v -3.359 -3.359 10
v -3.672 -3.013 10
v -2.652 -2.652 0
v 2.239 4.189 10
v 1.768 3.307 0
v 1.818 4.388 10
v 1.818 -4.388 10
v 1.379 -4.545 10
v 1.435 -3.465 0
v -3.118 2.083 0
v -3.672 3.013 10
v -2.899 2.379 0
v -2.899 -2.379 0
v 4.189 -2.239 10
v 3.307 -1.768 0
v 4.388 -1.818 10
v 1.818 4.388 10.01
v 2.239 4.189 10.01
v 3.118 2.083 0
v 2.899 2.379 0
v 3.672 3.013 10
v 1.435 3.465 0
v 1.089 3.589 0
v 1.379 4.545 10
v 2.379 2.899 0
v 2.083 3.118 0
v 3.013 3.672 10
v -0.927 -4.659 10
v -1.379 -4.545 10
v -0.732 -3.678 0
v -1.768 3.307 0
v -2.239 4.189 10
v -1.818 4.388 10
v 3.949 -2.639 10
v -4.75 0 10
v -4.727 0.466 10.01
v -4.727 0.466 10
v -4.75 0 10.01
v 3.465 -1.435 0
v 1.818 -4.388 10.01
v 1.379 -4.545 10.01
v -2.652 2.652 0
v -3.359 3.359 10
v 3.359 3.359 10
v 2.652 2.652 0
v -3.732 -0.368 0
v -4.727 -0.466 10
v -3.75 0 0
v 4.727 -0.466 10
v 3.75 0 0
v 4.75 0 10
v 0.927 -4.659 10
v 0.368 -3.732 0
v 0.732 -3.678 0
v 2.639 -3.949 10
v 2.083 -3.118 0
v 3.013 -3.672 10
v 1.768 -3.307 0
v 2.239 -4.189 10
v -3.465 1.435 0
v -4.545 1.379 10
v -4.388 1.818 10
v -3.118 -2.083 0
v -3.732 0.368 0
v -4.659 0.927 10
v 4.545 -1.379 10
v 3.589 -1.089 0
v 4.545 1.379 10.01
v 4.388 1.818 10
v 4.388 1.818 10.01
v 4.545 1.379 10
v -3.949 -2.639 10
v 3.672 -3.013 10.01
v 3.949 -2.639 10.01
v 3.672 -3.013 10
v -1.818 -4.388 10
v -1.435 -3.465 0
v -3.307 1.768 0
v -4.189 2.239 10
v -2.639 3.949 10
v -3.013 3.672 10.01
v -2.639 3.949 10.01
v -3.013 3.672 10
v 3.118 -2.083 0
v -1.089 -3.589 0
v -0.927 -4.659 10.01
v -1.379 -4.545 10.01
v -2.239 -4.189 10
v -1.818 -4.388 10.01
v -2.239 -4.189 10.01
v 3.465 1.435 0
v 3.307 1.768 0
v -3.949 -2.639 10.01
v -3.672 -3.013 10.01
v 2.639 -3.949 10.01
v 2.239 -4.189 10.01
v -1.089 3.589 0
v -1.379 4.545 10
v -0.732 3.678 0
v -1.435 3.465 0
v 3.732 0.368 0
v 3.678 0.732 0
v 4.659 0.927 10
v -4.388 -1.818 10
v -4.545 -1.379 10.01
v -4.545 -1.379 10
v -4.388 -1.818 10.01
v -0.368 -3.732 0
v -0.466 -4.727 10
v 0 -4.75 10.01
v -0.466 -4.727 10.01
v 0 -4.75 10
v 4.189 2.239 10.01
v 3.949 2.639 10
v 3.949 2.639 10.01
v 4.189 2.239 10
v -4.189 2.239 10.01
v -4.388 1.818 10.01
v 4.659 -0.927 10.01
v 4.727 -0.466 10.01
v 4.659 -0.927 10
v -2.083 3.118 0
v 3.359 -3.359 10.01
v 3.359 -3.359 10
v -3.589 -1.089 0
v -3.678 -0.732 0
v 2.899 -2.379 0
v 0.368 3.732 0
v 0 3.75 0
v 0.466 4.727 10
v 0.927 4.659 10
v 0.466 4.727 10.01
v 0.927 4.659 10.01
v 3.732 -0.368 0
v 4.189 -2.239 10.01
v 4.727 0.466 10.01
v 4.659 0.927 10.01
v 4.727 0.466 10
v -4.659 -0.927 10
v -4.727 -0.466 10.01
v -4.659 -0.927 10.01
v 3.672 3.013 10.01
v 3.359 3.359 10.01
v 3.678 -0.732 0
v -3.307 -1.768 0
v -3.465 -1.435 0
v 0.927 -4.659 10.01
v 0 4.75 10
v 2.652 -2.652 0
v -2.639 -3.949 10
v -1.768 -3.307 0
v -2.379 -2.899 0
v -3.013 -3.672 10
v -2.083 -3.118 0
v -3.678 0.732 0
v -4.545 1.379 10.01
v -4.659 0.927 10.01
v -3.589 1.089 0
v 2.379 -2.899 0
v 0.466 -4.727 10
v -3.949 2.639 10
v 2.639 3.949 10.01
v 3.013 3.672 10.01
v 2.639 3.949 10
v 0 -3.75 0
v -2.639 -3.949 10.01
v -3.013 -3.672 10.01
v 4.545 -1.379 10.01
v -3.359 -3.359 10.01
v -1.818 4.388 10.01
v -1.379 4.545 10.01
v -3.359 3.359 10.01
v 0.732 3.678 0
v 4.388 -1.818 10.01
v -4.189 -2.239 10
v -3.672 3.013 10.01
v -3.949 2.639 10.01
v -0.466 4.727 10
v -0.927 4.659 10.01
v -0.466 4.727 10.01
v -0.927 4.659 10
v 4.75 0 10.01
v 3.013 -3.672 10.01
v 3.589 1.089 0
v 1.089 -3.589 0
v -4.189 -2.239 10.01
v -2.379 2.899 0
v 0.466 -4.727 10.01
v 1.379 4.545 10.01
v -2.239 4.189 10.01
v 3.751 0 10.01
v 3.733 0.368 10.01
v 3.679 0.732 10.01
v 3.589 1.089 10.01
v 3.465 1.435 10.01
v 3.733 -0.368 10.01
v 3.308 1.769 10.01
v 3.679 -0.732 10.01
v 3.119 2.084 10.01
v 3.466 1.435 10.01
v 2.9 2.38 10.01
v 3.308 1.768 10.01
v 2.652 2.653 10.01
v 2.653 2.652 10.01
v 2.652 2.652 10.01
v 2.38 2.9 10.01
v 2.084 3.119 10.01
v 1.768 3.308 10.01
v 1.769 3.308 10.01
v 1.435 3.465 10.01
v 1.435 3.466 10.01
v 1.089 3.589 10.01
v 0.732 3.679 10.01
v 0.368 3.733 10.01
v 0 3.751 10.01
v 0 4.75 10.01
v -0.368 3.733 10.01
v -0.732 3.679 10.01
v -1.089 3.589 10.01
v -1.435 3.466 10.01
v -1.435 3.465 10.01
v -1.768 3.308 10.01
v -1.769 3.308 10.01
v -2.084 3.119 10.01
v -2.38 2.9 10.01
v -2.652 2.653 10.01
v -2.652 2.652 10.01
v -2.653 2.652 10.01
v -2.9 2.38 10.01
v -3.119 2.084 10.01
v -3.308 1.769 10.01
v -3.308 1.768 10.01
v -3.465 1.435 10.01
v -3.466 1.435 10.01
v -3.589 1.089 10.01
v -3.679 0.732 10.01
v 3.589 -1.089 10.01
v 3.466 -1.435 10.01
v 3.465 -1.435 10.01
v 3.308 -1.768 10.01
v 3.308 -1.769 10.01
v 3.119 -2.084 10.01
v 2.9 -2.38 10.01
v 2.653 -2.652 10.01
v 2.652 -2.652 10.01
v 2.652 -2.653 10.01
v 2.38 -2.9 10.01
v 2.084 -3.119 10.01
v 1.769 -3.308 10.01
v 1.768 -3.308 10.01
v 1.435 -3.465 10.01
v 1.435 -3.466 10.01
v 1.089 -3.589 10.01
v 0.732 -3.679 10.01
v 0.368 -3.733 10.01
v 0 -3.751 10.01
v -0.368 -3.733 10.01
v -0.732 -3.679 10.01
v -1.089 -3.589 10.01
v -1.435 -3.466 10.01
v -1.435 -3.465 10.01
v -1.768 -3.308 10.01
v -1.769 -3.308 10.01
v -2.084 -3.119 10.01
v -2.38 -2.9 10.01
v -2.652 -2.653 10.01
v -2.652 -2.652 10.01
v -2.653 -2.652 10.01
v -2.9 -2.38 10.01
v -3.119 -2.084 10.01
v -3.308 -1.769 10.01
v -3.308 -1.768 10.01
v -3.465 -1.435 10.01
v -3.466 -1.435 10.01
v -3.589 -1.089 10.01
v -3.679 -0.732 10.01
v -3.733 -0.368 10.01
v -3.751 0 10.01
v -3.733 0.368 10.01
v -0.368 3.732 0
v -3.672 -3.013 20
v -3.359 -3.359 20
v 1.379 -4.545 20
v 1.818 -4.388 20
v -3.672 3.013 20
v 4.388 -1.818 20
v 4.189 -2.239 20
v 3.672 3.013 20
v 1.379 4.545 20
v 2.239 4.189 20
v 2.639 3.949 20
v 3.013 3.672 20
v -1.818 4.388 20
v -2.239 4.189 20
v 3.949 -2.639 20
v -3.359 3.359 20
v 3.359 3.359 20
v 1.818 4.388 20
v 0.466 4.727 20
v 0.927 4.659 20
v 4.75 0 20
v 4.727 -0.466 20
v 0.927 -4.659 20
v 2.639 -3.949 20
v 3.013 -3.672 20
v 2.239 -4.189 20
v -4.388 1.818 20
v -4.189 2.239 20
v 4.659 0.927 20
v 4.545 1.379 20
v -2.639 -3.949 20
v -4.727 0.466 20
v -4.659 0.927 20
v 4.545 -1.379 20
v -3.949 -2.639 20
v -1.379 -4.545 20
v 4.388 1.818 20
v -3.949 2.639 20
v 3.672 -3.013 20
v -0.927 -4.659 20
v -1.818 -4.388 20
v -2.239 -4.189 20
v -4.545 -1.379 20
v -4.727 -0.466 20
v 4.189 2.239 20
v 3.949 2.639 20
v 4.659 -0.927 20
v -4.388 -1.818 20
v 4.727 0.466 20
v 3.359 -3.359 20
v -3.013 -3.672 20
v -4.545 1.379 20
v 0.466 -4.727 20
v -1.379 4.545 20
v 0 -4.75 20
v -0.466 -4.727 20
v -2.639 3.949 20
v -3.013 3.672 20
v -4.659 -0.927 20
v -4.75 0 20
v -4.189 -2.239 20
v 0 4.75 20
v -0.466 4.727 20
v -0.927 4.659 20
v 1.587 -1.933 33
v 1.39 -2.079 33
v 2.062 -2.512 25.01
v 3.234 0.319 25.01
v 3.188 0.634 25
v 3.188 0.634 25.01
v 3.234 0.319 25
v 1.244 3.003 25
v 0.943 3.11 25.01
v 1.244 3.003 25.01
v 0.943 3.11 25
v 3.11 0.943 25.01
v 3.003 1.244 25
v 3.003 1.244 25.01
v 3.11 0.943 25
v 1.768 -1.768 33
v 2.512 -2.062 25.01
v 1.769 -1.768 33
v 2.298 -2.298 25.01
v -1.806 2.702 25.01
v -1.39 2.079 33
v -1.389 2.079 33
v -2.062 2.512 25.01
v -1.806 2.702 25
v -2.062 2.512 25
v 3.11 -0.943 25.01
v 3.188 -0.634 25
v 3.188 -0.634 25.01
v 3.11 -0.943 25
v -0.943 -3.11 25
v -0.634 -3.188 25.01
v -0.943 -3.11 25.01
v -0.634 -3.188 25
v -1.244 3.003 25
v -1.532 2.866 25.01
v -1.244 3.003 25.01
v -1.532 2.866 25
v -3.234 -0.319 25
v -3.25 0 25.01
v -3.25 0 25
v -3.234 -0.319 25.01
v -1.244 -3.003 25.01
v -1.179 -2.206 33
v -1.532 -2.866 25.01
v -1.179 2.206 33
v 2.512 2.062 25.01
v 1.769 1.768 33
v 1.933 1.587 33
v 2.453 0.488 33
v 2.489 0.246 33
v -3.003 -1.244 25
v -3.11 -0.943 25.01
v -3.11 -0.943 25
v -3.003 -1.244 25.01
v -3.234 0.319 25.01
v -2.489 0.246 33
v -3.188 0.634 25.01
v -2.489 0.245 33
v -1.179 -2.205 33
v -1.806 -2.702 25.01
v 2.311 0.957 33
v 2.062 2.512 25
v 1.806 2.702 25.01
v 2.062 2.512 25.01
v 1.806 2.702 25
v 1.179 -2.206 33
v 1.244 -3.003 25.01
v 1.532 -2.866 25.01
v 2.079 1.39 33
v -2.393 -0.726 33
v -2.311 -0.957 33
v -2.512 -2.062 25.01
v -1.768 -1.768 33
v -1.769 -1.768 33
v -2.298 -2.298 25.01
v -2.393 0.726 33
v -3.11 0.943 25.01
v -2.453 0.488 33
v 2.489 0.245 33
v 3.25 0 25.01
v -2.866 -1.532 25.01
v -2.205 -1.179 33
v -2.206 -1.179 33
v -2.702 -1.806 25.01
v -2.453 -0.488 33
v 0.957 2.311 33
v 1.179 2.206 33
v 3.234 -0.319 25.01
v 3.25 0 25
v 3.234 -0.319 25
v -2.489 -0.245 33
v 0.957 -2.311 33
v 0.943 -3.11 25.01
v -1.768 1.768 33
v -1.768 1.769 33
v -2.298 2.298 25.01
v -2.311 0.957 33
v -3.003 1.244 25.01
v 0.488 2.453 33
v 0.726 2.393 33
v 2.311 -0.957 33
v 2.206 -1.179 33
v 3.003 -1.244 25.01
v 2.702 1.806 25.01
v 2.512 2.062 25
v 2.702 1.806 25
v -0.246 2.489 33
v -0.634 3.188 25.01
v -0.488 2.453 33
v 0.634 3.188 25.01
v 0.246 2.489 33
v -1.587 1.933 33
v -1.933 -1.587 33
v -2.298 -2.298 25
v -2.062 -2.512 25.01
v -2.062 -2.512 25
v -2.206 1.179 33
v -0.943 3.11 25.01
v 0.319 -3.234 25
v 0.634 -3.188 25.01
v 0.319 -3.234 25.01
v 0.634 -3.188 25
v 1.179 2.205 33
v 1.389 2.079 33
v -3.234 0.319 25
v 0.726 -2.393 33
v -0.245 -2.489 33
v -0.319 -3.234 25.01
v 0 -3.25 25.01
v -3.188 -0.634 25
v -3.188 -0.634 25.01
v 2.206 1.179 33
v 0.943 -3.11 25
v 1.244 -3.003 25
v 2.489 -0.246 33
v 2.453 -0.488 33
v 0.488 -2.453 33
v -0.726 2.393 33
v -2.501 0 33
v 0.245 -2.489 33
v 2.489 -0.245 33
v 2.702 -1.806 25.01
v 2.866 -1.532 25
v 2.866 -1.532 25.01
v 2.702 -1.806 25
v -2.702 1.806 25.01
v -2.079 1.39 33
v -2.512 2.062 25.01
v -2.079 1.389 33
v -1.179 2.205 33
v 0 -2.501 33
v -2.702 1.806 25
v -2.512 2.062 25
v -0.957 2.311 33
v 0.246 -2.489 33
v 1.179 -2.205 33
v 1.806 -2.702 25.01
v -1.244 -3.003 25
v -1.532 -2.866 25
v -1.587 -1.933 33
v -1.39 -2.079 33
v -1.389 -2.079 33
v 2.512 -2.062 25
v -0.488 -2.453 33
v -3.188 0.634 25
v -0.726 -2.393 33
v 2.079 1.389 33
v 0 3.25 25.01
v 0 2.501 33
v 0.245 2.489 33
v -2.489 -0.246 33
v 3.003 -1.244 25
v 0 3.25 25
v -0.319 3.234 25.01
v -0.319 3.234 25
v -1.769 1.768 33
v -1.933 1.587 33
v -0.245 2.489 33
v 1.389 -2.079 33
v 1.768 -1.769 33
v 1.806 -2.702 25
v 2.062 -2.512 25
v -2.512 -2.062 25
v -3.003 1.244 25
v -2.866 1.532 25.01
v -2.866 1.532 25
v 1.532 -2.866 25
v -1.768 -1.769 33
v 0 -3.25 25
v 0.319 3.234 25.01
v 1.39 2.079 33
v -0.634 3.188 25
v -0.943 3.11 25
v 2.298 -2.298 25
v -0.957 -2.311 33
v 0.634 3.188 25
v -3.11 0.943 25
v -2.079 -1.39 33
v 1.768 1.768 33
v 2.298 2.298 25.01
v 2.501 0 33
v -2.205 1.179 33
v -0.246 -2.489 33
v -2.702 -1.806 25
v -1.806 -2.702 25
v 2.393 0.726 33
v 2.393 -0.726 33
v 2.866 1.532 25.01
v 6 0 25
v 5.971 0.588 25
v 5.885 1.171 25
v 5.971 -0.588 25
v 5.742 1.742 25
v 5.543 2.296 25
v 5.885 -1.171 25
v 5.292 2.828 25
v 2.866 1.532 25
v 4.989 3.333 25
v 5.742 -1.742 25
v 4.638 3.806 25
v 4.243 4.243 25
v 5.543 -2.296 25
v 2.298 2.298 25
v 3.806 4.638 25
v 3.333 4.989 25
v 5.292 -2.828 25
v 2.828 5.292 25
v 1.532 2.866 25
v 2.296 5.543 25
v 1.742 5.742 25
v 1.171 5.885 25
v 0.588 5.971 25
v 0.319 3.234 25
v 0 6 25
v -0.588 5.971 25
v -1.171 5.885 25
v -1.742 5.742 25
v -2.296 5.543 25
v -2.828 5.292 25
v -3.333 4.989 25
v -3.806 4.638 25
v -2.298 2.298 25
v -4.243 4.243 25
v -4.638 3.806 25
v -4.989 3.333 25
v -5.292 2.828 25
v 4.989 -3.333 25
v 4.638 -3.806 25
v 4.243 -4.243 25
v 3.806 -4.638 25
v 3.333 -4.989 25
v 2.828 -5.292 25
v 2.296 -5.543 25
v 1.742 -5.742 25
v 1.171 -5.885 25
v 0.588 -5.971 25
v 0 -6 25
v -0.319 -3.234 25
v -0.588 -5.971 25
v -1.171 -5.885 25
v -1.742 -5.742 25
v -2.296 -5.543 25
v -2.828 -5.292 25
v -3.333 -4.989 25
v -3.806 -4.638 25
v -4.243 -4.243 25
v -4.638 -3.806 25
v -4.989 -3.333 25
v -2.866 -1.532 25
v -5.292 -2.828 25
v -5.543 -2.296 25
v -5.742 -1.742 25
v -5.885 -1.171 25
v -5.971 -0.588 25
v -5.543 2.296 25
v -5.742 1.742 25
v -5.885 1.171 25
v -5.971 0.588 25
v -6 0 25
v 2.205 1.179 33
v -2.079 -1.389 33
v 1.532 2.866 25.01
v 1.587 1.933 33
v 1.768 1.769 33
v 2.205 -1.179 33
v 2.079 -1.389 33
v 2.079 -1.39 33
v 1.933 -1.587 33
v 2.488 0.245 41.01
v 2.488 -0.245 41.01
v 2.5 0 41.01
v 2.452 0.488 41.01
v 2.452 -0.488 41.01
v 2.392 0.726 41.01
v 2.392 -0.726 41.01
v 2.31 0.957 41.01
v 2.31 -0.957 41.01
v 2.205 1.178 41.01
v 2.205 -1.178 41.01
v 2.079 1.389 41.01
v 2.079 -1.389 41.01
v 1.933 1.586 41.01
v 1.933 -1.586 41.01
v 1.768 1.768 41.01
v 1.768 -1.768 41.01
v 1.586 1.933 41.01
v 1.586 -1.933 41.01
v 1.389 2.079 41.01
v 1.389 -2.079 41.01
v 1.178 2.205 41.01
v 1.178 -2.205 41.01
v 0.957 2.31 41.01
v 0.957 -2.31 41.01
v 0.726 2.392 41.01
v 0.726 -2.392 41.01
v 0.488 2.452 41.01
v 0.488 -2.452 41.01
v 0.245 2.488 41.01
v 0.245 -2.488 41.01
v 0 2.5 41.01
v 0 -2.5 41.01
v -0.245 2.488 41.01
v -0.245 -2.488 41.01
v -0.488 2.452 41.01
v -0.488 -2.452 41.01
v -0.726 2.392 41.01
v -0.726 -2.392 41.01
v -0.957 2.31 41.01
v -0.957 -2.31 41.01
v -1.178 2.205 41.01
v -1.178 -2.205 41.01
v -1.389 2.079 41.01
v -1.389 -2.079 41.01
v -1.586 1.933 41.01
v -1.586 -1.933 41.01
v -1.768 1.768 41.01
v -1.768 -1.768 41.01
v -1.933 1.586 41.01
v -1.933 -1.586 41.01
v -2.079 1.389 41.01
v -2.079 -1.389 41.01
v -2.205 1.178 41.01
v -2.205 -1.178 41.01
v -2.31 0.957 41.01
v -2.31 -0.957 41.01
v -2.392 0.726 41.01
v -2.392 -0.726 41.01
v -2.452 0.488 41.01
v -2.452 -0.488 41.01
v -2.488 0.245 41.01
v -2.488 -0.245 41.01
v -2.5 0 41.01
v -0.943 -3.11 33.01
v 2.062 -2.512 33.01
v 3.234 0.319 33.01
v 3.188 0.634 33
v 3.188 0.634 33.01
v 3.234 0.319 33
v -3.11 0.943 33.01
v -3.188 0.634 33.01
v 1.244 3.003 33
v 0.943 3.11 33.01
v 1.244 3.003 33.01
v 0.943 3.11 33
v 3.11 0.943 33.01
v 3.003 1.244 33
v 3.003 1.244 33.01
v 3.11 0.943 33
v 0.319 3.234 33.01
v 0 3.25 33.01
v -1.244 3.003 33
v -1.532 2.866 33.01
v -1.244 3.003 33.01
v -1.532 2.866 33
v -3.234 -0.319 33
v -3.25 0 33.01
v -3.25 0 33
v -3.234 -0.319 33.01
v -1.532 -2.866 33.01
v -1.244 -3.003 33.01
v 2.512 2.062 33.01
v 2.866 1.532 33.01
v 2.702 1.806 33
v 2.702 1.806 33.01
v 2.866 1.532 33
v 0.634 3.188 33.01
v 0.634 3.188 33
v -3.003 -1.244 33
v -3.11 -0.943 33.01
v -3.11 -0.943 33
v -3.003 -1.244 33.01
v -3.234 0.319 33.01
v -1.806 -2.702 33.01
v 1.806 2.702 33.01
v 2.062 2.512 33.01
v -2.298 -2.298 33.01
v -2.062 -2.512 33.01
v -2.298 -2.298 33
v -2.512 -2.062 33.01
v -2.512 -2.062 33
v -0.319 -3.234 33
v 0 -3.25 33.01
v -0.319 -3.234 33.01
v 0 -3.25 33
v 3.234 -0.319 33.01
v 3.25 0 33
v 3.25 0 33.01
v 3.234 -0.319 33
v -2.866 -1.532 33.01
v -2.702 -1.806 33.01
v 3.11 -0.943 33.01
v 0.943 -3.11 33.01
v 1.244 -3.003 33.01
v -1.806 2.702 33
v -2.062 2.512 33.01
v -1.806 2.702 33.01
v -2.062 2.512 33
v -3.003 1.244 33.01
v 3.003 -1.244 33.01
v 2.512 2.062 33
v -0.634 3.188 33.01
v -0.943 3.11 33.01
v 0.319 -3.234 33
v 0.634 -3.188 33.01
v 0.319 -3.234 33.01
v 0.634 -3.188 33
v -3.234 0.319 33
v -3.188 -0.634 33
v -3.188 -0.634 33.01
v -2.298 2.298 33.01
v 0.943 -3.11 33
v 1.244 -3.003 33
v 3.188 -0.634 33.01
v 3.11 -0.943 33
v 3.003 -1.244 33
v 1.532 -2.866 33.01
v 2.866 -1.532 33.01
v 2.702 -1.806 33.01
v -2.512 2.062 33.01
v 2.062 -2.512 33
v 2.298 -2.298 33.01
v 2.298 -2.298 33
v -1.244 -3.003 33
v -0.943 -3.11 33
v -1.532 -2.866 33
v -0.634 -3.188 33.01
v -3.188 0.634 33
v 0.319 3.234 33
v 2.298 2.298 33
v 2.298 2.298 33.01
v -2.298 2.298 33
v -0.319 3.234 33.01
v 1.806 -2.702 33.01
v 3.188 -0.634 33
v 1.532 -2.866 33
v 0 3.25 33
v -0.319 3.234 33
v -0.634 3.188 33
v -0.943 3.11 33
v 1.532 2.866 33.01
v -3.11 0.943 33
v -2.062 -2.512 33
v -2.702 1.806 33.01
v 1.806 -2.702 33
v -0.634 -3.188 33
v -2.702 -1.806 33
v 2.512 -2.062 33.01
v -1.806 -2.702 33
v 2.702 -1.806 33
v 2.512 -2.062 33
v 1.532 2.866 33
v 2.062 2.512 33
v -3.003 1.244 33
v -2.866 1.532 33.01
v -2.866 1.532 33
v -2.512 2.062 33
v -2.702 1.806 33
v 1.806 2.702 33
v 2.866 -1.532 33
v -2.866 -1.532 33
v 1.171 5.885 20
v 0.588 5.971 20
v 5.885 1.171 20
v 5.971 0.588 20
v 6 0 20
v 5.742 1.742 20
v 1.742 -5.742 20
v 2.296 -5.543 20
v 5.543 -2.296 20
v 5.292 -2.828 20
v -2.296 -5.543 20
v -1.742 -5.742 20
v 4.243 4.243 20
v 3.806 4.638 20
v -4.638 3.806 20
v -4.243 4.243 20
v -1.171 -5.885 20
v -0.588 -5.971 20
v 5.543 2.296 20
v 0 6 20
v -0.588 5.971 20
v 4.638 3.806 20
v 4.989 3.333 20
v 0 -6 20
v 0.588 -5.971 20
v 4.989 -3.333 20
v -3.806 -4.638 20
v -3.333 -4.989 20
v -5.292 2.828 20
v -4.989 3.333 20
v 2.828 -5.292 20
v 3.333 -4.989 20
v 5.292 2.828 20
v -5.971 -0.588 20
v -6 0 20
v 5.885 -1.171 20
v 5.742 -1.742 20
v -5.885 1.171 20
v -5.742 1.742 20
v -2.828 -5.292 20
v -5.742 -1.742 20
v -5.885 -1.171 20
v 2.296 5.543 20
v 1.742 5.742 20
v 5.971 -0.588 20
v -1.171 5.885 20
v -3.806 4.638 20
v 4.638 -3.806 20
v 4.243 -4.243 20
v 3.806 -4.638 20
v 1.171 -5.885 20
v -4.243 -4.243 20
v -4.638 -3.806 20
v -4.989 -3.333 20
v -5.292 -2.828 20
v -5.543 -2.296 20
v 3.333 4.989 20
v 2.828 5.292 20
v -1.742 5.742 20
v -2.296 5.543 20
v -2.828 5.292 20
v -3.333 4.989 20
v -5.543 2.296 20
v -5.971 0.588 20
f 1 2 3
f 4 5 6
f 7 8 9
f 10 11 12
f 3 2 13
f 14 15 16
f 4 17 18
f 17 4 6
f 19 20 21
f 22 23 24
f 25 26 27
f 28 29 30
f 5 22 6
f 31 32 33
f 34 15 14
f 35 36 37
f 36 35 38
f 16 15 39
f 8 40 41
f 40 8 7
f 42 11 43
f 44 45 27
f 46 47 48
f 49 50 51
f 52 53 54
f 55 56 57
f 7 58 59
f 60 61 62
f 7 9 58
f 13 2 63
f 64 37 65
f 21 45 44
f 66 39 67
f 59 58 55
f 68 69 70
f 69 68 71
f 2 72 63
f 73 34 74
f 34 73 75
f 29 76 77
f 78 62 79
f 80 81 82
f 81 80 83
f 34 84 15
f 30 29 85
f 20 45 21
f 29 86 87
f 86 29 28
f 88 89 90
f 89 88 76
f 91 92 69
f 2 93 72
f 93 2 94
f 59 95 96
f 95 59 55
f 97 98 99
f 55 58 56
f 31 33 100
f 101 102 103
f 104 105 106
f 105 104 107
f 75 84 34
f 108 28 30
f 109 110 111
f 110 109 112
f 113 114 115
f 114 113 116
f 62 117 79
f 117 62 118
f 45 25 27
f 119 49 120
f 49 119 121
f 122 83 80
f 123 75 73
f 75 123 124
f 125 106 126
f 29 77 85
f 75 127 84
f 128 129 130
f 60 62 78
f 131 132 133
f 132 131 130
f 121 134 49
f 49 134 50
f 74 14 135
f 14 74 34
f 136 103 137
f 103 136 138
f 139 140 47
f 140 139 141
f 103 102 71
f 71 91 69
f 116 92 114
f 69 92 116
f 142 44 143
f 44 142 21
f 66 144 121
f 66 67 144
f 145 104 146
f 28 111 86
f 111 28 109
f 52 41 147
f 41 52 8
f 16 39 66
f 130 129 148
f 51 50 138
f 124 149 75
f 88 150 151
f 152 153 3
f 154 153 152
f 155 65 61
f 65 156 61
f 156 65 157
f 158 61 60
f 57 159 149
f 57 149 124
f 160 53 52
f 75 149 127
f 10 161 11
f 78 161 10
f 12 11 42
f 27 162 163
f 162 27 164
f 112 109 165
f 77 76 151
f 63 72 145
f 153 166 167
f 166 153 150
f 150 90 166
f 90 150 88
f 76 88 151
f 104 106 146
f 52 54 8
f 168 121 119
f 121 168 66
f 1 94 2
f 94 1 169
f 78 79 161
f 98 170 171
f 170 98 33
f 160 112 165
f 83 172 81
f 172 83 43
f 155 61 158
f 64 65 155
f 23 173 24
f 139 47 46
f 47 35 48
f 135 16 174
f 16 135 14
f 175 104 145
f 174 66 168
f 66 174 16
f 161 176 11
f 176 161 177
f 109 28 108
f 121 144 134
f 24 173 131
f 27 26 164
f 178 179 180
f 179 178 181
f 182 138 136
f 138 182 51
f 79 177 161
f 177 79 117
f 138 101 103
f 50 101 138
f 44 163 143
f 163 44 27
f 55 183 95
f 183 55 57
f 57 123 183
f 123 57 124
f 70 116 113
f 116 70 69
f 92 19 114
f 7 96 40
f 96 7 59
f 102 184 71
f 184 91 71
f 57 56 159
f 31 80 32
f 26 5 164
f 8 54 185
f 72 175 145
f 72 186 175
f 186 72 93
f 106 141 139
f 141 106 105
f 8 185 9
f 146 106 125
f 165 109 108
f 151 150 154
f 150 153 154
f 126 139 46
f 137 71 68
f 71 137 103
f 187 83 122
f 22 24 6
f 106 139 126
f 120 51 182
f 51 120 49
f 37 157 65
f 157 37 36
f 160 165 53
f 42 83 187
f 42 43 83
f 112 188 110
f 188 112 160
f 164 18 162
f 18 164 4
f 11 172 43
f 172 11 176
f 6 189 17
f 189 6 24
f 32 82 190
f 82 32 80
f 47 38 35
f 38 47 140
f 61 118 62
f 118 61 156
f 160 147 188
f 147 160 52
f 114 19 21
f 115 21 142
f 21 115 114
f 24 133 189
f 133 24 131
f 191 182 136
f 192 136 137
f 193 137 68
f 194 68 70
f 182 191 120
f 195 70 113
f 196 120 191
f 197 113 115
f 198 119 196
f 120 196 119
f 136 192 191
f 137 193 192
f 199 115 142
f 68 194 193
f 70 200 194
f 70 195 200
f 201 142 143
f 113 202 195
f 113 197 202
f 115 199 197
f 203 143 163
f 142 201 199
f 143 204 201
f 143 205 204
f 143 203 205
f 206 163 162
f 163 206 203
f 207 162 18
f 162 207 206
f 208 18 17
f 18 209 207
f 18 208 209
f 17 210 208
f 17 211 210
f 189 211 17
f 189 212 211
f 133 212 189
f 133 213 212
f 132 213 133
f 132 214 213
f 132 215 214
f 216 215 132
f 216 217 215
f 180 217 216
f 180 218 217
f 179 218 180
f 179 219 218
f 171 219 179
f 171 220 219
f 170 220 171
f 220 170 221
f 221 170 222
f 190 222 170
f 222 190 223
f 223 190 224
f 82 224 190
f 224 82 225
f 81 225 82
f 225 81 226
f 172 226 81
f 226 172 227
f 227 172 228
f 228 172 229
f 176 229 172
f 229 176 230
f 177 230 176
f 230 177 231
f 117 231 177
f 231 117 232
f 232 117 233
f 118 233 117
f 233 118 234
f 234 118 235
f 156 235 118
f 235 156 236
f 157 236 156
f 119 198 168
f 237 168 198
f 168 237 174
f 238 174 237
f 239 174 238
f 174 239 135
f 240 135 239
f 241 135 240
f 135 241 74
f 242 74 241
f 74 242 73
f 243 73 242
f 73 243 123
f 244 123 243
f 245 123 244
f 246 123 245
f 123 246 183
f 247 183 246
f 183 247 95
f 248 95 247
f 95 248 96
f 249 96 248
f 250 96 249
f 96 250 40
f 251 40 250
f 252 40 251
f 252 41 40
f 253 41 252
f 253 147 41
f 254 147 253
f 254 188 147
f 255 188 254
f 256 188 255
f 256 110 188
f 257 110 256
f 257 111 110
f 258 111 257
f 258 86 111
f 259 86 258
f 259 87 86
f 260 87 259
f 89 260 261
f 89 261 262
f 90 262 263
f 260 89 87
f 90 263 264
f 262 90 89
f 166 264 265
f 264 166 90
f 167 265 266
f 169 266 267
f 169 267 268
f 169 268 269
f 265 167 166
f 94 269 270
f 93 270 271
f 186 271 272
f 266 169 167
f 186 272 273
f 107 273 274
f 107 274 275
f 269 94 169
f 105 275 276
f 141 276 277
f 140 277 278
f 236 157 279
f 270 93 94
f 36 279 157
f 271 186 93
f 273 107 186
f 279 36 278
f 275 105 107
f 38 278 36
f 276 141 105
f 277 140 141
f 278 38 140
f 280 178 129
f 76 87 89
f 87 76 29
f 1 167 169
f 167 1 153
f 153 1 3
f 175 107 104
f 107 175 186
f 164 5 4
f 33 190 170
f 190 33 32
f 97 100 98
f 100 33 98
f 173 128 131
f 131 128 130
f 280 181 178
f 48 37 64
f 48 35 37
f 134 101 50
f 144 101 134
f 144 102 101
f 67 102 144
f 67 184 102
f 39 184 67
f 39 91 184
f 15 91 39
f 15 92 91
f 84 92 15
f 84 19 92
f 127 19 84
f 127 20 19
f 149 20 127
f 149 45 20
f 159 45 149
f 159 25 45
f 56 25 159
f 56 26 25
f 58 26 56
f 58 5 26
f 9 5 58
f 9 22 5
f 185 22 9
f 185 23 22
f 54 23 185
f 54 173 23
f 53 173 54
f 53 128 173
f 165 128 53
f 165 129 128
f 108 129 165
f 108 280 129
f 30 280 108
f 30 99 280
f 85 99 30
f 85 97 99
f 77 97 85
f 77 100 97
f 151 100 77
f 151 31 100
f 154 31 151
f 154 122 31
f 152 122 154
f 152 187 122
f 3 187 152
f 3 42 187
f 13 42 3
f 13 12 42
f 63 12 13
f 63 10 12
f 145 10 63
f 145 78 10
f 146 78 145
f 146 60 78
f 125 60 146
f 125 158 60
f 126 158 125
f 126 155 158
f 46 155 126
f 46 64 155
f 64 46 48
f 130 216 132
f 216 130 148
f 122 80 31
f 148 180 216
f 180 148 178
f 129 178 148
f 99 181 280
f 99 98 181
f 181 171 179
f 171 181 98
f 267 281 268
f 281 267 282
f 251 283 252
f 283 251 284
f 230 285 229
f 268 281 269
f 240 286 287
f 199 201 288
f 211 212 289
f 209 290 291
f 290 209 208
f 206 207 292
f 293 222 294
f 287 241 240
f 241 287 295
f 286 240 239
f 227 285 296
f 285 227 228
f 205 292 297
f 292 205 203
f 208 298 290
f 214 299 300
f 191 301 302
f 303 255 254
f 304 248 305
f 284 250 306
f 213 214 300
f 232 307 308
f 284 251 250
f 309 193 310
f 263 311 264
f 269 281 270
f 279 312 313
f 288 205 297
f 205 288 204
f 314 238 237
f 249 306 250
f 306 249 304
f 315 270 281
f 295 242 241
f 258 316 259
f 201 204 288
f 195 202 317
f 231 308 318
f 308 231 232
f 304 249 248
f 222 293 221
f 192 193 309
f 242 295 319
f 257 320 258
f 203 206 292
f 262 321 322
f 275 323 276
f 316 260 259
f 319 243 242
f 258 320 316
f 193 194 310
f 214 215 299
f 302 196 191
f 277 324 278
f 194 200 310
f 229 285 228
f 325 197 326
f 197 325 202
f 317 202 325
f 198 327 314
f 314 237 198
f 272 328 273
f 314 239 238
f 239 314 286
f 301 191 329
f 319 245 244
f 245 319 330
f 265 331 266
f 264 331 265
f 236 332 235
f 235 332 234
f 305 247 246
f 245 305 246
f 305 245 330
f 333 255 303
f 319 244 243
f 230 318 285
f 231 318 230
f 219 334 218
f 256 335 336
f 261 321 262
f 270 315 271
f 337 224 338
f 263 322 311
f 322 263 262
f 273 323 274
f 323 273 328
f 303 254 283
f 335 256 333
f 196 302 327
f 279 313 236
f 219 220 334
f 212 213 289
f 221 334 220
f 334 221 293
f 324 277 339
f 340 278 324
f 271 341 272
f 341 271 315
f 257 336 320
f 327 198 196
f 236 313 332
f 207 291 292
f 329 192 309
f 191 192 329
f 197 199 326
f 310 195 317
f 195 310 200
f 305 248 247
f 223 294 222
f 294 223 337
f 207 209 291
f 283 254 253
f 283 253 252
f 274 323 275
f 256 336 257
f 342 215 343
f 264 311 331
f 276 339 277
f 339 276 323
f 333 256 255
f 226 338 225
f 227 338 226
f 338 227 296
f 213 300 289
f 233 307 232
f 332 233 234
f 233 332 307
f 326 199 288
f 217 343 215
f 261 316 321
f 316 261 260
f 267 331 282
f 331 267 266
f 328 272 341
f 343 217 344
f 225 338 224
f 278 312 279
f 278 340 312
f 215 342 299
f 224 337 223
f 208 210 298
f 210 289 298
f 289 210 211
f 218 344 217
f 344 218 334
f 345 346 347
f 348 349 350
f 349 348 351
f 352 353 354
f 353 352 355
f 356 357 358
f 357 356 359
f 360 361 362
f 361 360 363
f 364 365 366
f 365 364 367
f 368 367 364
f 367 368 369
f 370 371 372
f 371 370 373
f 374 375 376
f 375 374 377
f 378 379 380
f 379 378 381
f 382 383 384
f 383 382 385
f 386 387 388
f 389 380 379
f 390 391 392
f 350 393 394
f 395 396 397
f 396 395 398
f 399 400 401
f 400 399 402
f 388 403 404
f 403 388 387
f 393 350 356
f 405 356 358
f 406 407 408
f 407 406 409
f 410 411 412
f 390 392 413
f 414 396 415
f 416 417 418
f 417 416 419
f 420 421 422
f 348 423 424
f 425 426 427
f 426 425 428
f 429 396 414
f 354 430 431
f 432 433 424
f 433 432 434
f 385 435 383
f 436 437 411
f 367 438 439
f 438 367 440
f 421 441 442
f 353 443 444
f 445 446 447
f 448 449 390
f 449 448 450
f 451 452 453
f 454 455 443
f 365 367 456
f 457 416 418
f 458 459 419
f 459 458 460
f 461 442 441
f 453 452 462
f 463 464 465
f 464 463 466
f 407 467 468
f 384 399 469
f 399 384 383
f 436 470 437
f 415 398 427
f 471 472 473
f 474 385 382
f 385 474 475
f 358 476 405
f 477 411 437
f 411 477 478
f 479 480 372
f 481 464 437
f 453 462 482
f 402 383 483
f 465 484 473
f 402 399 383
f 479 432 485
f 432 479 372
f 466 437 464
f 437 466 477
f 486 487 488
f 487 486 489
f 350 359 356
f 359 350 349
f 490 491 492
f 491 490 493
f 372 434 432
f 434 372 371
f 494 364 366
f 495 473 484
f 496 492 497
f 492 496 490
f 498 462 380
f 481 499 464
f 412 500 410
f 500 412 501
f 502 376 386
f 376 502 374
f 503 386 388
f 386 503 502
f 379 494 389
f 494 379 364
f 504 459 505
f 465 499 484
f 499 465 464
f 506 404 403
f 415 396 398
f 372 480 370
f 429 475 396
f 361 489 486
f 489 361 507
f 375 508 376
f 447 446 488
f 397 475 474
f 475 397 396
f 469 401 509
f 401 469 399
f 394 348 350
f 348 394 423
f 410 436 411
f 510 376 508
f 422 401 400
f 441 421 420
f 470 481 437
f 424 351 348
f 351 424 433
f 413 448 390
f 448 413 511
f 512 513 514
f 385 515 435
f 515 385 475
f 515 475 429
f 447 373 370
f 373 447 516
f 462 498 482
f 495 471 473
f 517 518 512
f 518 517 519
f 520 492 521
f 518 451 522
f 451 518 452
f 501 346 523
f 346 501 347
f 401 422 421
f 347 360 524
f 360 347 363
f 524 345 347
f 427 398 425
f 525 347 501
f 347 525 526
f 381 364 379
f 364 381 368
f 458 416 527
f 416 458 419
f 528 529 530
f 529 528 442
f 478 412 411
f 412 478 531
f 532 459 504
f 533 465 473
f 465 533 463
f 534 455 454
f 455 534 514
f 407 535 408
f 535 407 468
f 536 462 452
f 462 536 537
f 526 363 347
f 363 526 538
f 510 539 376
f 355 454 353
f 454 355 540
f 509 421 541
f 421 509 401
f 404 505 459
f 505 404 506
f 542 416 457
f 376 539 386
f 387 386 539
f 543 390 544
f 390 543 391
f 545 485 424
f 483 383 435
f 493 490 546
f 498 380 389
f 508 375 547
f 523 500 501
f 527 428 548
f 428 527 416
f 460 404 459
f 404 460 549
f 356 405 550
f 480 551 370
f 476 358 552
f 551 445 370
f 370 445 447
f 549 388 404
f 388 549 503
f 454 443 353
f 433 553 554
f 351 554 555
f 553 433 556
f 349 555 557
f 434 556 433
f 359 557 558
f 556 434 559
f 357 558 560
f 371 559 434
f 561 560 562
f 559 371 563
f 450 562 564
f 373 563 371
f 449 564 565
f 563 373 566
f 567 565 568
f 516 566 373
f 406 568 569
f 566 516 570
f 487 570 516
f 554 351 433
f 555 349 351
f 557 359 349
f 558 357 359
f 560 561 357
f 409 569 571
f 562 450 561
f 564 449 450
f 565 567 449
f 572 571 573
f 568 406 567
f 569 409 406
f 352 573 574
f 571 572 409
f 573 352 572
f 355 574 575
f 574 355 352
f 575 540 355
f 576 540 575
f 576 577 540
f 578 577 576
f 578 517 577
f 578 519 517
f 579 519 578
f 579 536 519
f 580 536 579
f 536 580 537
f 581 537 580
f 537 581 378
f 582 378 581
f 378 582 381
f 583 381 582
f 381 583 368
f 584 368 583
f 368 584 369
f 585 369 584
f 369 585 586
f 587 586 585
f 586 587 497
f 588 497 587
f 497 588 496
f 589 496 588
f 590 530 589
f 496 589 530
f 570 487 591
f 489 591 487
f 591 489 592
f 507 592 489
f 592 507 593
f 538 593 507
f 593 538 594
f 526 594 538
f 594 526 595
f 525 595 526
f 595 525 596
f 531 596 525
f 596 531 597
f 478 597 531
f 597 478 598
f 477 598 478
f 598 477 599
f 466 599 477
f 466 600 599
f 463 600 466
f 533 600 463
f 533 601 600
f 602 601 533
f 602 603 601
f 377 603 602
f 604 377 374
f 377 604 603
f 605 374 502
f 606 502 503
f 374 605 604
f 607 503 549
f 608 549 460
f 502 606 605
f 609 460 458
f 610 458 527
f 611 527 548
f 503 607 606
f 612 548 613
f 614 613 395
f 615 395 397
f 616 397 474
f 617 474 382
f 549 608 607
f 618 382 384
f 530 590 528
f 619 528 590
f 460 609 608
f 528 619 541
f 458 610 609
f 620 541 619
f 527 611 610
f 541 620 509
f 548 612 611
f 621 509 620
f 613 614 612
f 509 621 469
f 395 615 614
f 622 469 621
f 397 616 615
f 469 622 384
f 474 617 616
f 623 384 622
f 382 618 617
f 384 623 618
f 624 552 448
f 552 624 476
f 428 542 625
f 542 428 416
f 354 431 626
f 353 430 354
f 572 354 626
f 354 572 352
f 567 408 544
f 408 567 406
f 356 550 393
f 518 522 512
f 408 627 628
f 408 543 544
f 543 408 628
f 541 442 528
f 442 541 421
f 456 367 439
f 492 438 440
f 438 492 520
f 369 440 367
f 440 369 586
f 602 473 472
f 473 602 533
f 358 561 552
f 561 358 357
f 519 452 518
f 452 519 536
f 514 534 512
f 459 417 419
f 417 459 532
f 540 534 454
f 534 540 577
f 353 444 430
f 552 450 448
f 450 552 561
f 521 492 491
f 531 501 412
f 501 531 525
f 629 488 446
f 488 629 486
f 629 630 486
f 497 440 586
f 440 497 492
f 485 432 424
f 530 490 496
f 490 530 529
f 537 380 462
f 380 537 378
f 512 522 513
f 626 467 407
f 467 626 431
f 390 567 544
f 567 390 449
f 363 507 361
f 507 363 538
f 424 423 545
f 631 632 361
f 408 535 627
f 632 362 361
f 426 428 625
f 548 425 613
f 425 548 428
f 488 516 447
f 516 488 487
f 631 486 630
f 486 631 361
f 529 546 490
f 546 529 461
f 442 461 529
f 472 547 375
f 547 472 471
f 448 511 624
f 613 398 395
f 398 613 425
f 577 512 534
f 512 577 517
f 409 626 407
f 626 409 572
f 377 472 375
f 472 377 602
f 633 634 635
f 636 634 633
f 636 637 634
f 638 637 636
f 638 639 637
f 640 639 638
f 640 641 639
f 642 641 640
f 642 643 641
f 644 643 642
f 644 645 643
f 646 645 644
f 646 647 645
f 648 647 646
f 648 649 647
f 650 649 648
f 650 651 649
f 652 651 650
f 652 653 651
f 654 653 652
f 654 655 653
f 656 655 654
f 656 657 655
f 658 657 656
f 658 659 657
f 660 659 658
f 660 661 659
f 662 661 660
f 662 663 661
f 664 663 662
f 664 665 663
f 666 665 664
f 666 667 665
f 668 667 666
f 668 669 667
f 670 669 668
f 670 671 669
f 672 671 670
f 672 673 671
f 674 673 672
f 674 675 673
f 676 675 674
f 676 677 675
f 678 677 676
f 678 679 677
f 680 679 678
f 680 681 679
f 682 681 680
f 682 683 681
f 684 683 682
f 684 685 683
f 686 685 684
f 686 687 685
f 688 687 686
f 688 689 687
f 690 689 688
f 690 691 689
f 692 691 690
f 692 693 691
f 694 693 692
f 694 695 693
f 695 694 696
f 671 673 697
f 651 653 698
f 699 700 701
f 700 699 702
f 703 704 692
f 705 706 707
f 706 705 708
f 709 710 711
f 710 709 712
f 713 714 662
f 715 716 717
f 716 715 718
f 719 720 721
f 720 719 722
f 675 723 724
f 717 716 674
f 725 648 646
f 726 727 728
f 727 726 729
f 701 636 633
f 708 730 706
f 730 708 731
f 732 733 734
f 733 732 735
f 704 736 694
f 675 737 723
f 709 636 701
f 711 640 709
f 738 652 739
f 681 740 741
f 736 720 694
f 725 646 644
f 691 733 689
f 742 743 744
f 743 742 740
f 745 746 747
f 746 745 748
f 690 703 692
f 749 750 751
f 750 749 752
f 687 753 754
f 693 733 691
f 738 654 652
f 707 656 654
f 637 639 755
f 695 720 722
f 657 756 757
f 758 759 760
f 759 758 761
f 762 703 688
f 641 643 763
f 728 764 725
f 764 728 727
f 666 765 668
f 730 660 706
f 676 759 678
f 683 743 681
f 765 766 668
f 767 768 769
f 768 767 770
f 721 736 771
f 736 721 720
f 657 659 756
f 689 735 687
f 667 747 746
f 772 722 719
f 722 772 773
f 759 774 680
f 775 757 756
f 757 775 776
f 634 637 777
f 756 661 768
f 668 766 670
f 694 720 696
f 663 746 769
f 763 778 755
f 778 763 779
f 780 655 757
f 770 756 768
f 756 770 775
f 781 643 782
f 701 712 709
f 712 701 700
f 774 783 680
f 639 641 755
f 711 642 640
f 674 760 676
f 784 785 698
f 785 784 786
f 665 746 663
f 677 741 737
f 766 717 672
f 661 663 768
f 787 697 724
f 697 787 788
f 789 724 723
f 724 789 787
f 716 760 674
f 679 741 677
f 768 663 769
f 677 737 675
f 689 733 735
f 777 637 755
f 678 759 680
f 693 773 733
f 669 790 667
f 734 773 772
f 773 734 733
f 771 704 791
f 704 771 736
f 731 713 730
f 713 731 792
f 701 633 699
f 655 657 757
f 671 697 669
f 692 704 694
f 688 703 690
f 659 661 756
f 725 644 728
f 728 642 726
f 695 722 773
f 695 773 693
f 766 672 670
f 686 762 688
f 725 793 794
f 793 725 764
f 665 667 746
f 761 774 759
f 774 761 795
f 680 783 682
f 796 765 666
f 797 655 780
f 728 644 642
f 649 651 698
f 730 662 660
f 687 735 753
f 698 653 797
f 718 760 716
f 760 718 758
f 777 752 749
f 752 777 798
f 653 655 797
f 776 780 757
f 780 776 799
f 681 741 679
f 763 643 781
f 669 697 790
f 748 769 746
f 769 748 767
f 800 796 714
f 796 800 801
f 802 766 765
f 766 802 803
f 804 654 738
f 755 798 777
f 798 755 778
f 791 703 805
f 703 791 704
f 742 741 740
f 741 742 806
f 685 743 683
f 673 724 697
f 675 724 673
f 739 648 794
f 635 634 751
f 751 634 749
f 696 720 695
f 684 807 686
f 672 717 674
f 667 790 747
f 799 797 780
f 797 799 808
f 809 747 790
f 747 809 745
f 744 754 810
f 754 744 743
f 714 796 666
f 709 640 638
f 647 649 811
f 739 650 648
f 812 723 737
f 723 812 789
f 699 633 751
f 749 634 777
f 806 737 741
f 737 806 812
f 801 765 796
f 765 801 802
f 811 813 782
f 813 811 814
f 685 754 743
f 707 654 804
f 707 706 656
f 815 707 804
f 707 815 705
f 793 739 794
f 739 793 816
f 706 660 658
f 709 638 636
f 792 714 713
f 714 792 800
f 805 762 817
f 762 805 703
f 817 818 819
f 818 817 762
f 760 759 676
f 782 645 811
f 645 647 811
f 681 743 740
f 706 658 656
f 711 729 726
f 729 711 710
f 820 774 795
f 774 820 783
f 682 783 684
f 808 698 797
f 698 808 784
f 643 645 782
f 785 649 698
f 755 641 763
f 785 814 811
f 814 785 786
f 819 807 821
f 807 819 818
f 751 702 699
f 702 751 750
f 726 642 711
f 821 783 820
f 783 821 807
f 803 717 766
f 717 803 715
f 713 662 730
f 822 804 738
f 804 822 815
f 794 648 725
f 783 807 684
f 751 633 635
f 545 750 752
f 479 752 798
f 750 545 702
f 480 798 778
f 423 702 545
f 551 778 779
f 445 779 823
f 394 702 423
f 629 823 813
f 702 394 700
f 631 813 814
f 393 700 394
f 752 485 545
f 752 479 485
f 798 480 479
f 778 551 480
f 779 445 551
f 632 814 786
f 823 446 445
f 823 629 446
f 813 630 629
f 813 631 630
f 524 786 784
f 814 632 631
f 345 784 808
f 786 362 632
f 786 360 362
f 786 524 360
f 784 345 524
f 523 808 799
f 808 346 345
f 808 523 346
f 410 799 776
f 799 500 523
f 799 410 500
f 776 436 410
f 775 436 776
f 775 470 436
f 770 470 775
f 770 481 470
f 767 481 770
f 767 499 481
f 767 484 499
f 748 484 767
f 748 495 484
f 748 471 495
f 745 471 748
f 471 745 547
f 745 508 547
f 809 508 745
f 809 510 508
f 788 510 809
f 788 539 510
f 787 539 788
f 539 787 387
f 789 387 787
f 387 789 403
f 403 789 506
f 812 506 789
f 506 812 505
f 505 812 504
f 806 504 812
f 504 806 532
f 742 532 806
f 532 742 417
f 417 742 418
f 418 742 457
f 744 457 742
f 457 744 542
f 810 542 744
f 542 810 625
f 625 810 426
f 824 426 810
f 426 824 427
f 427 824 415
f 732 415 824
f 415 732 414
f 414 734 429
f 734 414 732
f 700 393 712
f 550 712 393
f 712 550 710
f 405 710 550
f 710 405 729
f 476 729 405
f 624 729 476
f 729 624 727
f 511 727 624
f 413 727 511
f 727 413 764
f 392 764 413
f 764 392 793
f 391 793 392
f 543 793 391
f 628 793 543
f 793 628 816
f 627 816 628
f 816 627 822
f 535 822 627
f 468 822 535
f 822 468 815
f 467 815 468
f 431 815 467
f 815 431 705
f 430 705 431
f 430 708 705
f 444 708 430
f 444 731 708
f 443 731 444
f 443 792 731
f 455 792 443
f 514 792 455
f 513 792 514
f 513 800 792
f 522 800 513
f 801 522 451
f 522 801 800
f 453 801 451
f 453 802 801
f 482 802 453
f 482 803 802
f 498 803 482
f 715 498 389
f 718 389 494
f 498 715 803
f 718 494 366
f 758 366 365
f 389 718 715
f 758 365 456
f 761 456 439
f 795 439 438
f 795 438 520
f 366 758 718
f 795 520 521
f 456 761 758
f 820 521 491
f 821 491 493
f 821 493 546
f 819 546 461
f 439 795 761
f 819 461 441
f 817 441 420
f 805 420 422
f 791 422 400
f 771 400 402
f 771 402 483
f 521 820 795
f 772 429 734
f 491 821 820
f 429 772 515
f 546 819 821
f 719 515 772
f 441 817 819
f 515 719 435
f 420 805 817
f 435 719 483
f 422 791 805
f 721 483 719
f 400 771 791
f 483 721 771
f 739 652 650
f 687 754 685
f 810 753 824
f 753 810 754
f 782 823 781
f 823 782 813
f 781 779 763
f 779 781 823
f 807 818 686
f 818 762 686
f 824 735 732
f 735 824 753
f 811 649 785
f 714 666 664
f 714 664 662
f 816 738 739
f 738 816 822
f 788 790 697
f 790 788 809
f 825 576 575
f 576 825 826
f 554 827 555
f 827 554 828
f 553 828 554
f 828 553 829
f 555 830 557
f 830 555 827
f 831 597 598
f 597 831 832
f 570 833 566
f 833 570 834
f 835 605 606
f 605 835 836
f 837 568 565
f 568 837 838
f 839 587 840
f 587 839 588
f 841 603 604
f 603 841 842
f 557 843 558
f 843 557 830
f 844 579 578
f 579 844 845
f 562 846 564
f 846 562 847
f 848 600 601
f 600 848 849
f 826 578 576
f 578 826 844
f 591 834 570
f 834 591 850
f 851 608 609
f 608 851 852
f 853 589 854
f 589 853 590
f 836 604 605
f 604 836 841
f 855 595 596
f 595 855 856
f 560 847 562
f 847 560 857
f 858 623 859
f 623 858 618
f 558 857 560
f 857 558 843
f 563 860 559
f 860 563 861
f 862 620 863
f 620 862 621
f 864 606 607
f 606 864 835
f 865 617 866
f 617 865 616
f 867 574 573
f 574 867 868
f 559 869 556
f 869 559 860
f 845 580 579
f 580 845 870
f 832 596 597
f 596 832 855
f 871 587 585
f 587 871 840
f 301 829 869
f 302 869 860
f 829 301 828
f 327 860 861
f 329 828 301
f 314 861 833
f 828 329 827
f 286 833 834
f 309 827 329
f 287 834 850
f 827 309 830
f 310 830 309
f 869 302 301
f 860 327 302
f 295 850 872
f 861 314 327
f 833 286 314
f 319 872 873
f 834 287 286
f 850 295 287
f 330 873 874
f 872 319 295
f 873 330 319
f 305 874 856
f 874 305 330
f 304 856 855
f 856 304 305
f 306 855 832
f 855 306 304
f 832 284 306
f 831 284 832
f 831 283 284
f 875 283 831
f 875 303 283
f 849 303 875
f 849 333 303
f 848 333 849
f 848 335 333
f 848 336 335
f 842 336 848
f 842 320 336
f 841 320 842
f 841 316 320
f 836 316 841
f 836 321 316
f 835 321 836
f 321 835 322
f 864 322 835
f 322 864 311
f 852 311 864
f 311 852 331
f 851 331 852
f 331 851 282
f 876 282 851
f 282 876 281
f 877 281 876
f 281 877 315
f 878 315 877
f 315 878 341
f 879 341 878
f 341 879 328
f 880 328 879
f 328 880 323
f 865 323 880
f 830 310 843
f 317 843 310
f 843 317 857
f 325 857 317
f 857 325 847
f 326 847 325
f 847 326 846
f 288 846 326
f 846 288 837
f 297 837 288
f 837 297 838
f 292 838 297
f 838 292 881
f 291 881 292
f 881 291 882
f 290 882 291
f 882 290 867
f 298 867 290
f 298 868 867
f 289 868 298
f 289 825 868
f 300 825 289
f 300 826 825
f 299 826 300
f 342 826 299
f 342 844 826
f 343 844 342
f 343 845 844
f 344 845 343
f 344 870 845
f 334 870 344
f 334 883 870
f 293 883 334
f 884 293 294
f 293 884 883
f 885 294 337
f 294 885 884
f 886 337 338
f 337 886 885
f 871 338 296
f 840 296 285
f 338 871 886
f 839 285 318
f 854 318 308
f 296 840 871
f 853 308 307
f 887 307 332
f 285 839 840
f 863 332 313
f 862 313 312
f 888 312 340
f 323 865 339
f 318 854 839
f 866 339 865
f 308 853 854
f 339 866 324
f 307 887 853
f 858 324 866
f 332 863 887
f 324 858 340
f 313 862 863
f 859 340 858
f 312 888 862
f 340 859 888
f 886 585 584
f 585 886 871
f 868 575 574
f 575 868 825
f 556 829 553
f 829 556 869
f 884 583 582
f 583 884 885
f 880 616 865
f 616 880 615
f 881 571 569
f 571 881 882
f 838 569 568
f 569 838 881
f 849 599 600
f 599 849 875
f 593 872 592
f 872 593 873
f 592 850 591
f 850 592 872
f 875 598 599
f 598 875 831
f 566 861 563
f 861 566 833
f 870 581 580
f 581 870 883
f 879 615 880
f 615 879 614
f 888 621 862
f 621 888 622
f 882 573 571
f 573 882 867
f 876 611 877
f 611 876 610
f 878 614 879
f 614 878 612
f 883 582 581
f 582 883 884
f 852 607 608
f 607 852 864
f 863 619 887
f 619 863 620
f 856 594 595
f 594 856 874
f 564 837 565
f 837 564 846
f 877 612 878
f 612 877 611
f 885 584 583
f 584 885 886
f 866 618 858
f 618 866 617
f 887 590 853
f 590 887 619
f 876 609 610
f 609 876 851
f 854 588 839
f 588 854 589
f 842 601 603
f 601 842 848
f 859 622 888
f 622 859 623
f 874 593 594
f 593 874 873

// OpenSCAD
// --- Dimensions (mm) ---
bore_diameter = 3.0;             // Internal bore diameter
total_height = 41.0;             // Total height of the part

// 8mm Tubing Section (z = 0 to 20)
barb8_count = 2;                 // Number of barbs for 8mm side
barb8_height = 10.0;             // Height of each 8mm barb
barb8_base_dia = 7.5;            // Bottom diameter of 8mm barb
barb8_top_dia = 9.5;             // Top diameter of 8mm barb

// Transition Collar (z = 20 to 25)
collar_height = 5.0;             // Height of the cylindrical collar
collar_diameter = 12.0;          // Diameter of the collar

// 5mm Tubing Section (z = 25 to 41)
barb5_count = 2;                 // Number of barbs for 5mm side
barb5_height = 8.0;              // Height of each 5mm barb
barb5_base_dia = 6.5;            // Bottom diameter of 5mm barb
barb5_top_dia = 5.0;             // Top diameter of 5mm barb

// --- Rendering Settings ---
$fn = 64;

// --- Main Construction ---
union() {
    // 8mm Barb Section
    for (i = [0 : barb8_count - 1]) {
        translate([0, 0, i * barb8_height])
        barb_shape(barb8_base_dia, barb8_top_dia, barb8_height);
    }

    // Transition Collar
    translate([0, 0, 20])
    cylinder(h = collar_height, d = collar_diameter);

    // 5mm Barb Section
    // Note: The user specified z=25 to 41. 
    // 25 + (2 * 8) = 41. This fits perfectly.
    for (i = [0 : barb5_count - 1]) {
        translate([0, 0, 25 + (i * barb5_height)])
        barb_shape(barb5_base_dia, barb5_top_dia, barb5_height);
    }
}

// --- Subtract the Bore ---
difference() {
    // We use a union of the parts above, but to ensure a clean subtraction, 
    // we wrap the whole thing in a difference.
    // However, to keep the code clean, I will wrap the entire logic in a difference.
    // Let's redefine the structure to be cleaner.
}

// Re-structuring for proper difference() logic
// (The code above is the 'positive' part, now we subtract the bore)

// Corrected Structure:
// We will use a module to define the outer shell and then subtract the bore.

module outer_shell() {
    // 8mm Barb Section
    for (i = [0 : barb8_count - 1]) {
        translate([0, 0, i * barb8_height])
        barb_shape(barb8_base_dia, barb8_top_dia, barb8_height);
    }

    // Transition Collar
    translate([0, 0, 20])
    cylinder(h = collar_height, d = collar_diameter);

    // 5mm Barb Section
    for (i = [0 : barb5_count - 1]) {
        translate([0, 0, 25 + (i * barb5_height)])
        barb_shape(barb5_base_dia, barb5_top_dia, barb5_height);
    }
}

// Final Assembly
difference() {
    outer_shell();
    
    // The Bore
    // We extend the bore slightly beyond the top and bottom to ensure a clean cut
    translate([0, 0, -1])
    cylinder(h = total_height + 2, d = bore_diameter);
}

// --- Helper Modules ---

module barb_shape(base_d, top_d, h) {
    // Creates a frustum (tapered cylinder)
    // Since the user wants a "sawtooth" profile (taper then step back),
    // the barb_shape represents one single tapered segment.
    // The "step back" is handled by the fact that the next barb starts at a smaller diameter.
    // However, the prompt says "grows linearly... then steps straight back".
    // This implies the barb itself is a frustum.
    
    hull() {
        translate([0, 0, 0])
        cylinder(h = 0.01, d = base_d);
        translate([0, 0, h])
        cylinder(h = 0.01, d = top_d);
    }
}

// Note on the "sawtooth" requirement:
// The prompt describes the profile of the barb. 
// A single barb grows from base to top. 
// The "step back" occurs at the junction between barbs or at the end of a barb.
// My implementation of barb_shape creates the tapered part.
// The loop handles the stacking.
